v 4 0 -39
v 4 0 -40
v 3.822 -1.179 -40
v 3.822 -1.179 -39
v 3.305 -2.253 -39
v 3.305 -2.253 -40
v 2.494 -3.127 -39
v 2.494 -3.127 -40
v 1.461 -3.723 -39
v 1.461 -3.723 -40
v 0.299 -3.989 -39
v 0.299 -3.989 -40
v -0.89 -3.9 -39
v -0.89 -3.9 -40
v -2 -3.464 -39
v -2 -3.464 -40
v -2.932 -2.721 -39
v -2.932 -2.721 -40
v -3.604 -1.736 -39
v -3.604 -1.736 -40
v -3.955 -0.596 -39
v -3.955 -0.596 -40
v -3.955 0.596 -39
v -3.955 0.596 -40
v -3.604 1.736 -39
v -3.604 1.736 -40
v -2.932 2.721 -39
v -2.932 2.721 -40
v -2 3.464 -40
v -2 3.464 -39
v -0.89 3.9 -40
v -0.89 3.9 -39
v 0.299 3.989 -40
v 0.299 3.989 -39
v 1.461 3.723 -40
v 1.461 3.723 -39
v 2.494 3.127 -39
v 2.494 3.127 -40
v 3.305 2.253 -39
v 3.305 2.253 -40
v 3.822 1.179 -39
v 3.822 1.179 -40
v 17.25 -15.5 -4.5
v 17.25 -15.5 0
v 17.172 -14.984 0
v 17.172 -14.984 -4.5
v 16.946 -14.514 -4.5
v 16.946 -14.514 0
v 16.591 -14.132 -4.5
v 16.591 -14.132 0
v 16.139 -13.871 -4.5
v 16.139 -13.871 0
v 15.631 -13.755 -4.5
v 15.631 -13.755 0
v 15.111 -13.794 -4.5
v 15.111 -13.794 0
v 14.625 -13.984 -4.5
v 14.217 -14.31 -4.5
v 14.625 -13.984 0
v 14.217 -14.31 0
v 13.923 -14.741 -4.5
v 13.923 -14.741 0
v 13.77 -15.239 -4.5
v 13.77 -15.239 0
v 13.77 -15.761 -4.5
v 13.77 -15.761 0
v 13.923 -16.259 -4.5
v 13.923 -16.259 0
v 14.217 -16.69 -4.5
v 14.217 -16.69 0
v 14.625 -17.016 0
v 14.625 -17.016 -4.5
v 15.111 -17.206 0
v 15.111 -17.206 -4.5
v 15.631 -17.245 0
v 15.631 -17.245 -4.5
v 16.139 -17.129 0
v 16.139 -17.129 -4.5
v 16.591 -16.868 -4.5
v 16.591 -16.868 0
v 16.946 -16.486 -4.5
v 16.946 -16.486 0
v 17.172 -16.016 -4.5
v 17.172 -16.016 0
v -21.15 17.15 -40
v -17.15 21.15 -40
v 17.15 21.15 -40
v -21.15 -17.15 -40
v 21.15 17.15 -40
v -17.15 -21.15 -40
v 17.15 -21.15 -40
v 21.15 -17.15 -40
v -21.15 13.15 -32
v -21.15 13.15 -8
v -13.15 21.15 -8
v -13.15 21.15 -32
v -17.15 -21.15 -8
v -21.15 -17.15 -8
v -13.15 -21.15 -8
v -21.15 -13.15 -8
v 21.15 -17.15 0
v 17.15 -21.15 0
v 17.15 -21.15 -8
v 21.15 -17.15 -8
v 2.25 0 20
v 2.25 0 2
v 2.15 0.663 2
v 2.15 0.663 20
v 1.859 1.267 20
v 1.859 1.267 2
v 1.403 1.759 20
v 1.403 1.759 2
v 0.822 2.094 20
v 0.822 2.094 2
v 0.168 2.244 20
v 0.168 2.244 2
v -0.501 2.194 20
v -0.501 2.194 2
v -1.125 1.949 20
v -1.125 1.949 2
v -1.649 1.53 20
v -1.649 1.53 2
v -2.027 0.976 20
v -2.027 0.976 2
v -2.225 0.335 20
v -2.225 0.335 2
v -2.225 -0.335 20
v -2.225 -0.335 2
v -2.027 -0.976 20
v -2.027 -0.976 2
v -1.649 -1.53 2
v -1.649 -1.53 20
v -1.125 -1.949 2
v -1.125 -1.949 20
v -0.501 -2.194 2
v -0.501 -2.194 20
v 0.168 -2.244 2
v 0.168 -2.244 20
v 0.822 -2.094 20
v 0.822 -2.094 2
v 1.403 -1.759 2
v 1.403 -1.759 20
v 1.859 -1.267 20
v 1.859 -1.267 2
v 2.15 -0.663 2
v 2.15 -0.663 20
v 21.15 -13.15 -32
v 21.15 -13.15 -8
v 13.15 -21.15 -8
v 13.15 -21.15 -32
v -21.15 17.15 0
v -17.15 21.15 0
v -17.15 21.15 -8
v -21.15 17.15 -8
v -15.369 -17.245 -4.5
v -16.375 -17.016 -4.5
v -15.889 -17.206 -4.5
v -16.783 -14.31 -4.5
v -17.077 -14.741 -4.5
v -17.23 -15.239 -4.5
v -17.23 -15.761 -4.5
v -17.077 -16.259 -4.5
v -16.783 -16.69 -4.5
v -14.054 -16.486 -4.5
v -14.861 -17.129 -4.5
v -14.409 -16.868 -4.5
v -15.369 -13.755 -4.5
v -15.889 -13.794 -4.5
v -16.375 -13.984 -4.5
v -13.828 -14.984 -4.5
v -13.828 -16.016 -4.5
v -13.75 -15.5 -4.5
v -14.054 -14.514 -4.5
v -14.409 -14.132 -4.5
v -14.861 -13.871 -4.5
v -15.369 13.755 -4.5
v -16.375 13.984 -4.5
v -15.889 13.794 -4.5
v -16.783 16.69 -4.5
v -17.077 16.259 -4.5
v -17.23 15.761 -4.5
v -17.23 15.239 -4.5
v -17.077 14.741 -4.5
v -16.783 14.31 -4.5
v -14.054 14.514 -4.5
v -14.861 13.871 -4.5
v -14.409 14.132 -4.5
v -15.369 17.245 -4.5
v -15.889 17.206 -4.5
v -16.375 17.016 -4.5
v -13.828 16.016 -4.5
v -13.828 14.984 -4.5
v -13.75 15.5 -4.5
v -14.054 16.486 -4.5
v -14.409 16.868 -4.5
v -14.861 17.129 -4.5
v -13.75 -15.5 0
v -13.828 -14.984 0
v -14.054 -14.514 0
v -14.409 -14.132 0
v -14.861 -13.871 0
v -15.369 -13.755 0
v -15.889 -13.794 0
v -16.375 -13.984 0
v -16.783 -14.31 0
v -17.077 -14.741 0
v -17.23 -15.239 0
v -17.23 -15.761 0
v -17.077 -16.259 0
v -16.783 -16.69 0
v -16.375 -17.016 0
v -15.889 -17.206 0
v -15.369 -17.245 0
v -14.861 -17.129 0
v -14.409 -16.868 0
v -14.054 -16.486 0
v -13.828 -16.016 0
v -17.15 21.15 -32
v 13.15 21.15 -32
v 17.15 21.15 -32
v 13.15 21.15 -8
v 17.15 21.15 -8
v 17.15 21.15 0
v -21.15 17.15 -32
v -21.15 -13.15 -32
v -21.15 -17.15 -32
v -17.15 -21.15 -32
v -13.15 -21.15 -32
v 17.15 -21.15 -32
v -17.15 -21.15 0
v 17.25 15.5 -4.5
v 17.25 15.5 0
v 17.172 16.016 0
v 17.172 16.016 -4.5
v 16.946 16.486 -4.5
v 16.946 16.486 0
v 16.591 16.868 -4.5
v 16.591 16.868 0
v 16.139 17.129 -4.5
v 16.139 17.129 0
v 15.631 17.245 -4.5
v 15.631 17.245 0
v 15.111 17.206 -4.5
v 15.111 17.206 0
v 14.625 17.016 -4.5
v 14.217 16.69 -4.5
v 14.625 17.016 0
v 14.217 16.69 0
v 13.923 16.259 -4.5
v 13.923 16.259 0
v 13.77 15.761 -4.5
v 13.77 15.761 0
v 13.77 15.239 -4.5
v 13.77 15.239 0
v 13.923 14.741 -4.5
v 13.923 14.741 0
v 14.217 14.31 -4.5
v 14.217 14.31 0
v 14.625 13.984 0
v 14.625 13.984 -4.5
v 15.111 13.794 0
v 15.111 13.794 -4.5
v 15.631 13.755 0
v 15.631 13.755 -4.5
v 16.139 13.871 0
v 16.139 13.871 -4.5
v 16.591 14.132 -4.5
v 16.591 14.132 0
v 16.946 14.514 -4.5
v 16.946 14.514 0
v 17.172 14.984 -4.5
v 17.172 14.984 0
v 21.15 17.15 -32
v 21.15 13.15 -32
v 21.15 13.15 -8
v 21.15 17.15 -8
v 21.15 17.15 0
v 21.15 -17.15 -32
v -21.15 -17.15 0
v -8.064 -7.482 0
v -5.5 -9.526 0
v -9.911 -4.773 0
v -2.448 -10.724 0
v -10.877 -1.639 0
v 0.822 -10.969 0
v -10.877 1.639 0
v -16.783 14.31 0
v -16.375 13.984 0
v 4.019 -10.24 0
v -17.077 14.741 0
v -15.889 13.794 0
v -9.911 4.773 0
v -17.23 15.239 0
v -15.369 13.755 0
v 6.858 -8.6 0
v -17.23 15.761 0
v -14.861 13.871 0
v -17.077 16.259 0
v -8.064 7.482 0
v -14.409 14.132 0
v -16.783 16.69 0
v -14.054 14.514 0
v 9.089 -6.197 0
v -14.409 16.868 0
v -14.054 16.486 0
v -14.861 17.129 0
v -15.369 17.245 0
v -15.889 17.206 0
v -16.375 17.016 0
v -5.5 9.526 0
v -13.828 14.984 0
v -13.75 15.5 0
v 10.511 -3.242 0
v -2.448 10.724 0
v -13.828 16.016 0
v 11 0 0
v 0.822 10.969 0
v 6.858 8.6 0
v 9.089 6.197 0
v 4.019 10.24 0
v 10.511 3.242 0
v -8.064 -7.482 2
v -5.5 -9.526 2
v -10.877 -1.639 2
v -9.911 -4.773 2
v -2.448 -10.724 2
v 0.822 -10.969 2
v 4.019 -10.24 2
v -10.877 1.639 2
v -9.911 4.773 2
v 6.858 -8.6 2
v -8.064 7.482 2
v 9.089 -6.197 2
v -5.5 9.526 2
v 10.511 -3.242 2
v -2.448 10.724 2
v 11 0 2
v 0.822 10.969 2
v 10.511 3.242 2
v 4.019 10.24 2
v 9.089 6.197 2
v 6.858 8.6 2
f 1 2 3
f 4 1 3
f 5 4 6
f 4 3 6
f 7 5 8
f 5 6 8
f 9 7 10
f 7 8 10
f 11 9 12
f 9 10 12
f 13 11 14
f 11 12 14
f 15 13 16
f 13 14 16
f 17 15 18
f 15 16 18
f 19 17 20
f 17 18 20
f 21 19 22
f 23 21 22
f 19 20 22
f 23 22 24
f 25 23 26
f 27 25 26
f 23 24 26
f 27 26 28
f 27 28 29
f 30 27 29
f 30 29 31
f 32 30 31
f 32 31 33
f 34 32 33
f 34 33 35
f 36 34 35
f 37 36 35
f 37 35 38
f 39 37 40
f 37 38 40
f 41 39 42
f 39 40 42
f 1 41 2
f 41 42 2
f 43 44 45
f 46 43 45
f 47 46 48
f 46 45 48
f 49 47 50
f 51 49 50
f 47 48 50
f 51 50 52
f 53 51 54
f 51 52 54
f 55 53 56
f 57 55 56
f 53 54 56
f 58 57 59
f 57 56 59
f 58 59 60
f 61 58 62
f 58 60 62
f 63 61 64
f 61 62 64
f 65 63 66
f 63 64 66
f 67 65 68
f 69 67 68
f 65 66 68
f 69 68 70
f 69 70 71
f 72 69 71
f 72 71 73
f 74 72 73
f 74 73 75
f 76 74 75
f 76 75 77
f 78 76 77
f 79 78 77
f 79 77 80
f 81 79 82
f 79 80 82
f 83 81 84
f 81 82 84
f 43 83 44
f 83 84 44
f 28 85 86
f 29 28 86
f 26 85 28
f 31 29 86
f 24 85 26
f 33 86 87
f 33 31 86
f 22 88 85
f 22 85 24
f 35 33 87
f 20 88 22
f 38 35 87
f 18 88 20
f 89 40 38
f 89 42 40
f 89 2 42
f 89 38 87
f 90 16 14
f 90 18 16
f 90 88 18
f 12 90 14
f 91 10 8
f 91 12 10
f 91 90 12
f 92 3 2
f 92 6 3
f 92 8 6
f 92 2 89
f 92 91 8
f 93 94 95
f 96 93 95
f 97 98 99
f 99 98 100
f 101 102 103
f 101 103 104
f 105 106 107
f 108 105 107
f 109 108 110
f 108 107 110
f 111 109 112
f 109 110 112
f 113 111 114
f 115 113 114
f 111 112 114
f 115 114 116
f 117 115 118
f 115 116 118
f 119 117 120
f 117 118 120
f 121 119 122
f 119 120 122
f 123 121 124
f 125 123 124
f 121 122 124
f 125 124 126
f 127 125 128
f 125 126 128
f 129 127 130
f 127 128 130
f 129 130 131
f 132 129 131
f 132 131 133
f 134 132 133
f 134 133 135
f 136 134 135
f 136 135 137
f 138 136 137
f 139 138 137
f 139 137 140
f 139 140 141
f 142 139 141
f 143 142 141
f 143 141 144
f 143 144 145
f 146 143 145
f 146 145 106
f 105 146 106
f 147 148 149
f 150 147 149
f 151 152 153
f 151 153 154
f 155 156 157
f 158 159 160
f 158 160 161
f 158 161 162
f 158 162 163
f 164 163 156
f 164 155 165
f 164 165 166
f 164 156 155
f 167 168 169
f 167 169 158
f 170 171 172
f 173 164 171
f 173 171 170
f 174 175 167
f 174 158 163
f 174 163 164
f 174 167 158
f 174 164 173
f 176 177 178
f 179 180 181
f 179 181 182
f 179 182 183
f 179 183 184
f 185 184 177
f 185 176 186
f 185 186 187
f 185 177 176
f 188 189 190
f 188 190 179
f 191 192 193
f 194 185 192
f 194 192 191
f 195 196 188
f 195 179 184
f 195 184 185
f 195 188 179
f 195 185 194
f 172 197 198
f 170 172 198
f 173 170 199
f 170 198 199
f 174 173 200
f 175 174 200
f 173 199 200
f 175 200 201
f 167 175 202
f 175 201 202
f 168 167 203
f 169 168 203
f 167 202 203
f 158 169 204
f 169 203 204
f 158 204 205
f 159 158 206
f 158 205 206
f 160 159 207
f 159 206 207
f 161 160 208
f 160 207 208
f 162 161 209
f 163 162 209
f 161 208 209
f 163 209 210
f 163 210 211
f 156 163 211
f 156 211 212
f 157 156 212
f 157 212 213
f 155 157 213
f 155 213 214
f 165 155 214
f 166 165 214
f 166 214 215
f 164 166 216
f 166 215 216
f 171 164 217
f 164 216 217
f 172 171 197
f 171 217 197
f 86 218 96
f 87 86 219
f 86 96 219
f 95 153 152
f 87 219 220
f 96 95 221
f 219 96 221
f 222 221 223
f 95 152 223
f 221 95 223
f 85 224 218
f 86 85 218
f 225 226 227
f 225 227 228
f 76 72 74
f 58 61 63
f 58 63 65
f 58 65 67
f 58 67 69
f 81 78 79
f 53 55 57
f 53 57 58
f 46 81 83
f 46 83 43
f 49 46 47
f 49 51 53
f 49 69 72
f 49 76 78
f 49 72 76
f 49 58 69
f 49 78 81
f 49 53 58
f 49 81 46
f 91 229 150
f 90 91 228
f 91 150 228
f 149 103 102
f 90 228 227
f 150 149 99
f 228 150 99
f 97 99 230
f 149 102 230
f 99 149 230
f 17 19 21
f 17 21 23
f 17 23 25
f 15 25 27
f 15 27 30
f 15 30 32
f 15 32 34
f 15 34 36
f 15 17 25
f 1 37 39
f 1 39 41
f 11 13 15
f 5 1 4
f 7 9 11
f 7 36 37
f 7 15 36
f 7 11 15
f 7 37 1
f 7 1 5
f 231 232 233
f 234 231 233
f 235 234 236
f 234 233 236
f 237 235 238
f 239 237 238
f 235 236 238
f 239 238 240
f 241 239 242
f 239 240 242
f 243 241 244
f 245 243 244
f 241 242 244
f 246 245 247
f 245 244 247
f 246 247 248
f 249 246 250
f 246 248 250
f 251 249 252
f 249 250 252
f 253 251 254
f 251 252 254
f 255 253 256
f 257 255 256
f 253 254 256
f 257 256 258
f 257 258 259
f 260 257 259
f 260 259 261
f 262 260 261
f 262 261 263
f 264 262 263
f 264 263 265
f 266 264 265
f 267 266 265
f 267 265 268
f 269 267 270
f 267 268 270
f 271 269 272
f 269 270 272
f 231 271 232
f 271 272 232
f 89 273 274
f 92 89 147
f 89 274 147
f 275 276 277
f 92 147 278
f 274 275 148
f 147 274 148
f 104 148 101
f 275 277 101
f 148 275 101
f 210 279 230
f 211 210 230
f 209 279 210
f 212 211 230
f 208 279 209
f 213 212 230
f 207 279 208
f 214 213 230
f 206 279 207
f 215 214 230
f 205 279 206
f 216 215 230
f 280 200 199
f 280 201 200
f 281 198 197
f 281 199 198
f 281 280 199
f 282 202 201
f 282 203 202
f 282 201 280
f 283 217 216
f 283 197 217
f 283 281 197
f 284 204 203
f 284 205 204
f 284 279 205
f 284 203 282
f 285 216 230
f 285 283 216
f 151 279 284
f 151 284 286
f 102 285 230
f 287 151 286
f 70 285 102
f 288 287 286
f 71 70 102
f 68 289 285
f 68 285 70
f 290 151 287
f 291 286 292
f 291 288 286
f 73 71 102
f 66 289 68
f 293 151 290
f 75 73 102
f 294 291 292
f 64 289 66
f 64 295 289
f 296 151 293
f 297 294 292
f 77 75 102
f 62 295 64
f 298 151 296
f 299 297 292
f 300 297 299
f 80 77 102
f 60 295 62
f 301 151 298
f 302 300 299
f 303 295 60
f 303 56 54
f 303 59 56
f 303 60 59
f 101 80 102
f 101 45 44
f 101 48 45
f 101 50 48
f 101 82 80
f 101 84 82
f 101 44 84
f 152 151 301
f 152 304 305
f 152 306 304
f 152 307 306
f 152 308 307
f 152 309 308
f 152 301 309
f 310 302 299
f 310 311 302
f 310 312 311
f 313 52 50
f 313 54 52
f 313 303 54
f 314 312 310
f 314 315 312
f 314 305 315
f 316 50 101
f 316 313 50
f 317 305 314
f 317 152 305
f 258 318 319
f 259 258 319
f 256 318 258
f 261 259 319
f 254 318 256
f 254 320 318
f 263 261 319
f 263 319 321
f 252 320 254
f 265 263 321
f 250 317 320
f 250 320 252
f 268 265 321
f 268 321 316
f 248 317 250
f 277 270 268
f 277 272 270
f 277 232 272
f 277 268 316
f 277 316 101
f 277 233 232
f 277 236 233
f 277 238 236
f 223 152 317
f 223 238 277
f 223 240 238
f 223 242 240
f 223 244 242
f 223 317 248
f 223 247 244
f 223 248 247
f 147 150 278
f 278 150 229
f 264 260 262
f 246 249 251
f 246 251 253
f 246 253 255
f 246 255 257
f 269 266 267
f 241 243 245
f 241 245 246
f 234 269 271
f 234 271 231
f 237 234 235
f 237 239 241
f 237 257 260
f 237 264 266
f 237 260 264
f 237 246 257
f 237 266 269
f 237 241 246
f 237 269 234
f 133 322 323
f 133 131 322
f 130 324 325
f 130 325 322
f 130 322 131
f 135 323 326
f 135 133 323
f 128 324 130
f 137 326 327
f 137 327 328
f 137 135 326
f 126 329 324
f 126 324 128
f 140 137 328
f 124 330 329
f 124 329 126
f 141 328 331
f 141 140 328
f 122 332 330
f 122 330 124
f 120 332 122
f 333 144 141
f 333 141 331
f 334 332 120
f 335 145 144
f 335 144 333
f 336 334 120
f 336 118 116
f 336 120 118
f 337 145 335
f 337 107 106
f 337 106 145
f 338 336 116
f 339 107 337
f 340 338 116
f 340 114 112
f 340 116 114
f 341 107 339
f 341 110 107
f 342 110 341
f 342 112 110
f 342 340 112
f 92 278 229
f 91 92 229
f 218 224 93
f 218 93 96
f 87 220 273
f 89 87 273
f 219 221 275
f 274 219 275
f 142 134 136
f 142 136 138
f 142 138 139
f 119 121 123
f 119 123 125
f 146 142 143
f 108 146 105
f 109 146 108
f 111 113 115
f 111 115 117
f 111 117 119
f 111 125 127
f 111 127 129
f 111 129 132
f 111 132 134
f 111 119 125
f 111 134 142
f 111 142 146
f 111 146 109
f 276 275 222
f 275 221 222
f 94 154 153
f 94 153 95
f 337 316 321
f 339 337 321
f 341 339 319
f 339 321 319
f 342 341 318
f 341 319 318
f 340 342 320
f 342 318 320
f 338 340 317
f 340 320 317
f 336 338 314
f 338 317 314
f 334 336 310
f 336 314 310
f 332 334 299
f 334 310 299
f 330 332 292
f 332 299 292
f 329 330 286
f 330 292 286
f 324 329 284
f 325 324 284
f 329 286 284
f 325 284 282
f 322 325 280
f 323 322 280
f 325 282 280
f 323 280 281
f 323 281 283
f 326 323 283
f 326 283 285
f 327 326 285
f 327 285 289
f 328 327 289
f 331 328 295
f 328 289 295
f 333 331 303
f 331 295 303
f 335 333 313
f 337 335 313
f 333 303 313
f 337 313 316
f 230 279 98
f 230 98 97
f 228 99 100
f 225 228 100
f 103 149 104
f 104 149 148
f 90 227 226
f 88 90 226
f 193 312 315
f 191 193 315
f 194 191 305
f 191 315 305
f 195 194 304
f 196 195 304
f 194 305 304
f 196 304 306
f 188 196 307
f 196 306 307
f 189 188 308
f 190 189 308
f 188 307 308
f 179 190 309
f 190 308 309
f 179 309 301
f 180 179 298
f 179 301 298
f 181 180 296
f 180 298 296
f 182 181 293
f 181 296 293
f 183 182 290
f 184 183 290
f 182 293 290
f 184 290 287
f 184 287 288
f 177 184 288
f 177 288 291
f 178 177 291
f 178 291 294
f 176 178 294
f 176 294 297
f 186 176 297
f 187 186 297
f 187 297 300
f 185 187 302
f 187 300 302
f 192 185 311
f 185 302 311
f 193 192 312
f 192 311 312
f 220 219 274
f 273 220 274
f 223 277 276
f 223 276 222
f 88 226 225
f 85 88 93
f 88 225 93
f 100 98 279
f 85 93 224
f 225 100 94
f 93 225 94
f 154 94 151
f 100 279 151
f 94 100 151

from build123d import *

# Parameters (mm, degrees)
F1_R      = 11
F1_R_2    = 2.25
F2_DEPTH  = 2
F1_R_3    = 1.75
F3_DEPTH  = 8
F4_DEPTH  = 4.5
F5_DEPTH  = 20
F7_DEPTH  = 24
F9_DEPTH  = 8
F10_R     = 4
F11_DEPTH = 1


with BuildPart() as f2:
    # F1 (on Top) → F2 (new body)
    with BuildSketch(Plane.XY):
        Circle(F1_R)
        Circle(F1_R_2, mode=Mode.SUBTRACT)
    extrude(amount=F2_DEPTH)

    # F1 (on Top) → F3 (join)
    with BuildSketch(Plane.XY):
        Polygon((21.15, 17.15), (17.15, 21.15), (-17.15, 21.15), (-21.15, 17.15), (-21.15, -17.15), (-17.15, -21.15), (17.15, -21.15), (21.15, -17.15), align=None)
        with Locations((-15.5, -15.5)):
            Circle(F1_R_3, mode=Mode.SUBTRACT)
        with Locations((15.5, -15.5)):
            Circle(F1_R_3, mode=Mode.SUBTRACT)
        with Locations((-15.5, 15.5)):
            Circle(F1_R_3, mode=Mode.SUBTRACT)
        Circle(F1_R, mode=Mode.SUBTRACT)
        with Locations((15.5, 15.5)):
            Circle(F1_R_3, mode=Mode.SUBTRACT)
        Circle(F1_R)
        Circle(F1_R_2, mode=Mode.SUBTRACT)
        Circle(F1_R_2)
        with Locations((15.5, -15.5)):
            Circle(F1_R_3)
        with Locations((-15.5, -15.5)):
            Circle(F1_R_3)
        with Locations((-15.5, 15.5)):
            Circle(F1_R_3)
        with Locations((15.5, 15.5)):
            Circle(F1_R_3)
    extrude(amount=-F3_DEPTH)

    # F1 (on Top) → F4 (cut)
    with BuildSketch(Plane.XY):
        with Locations((-15.5, 15.5)):
            Circle(F1_R_3)
        with Locations((15.5, 15.5)):
            Circle(F1_R_3)
        with Locations((15.5, -15.5)):
            Circle(F1_R_3)
        with Locations((-15.5, -15.5)):
            Circle(F1_R_3)
    extrude(amount=-F4_DEPTH, mode=Mode.SUBTRACT)

    # F1 (on Top) → F5 (join)
    with BuildSketch(Plane.XY):
        Circle(F1_R_2)
    extrude(amount=F5_DEPTH)

    # F6 (on face) → F7 (join)
    with BuildSketch(Plane(origin=(0, 0, -8), x_dir=(1, 0, 0), z_dir=(0, 0, -1))):
        Polygon((-13.15, 21.15), (-21.15, 13.15), (-21.15, -13.15), (-13.15, -21.15), (13.15, -21.15), (21.15, -13.15), (21.15, 13.15), (13.15, 21.15), align=None)
    extrude(amount=F7_DEPTH)

    # F8 (on face) → F9 (join)
    with BuildSketch(Plane(origin=(0, 0, -32), x_dir=(1, 0, 0), z_dir=(0, 0, -1))):
        Polygon((-13.15, 21.15), (-17.15, 21.15), (-21.15, 17.15), (-21.15, 13.15), align=None)
        Polygon((13.15, 21.15), (-13.15, 21.15), (-21.15, 13.15), (-21.15, -13.15), (-13.15, -21.15), (13.15, -21.15), (21.15, -13.15), (21.15, 13.15), align=None)
        Polygon((17.15, 21.15), (13.15, 21.15), (21.15, 13.15), (21.15, 17.15), align=None)
        Polygon((21.15, -17.15), (21.15, -13.15), (13.15, -21.15), (17.15, -21.15), align=None)
        Polygon((-13.15, -21.15), (-21.15, -13.15), (-21.15, -17.15), (-17.15, -21.15), align=None)
    extrude(amount=F9_DEPTH)

    # F10 (on face) → F11 (cut)
    with BuildSketch(Plane(origin=(0, 0, -40), x_dir=(1, 0, 0), z_dir=(0, 0, -1))):
        Circle(F10_R)
    extrude(amount=-F11_DEPTH, mode=Mode.SUBTRACT)


solid = f2.part
